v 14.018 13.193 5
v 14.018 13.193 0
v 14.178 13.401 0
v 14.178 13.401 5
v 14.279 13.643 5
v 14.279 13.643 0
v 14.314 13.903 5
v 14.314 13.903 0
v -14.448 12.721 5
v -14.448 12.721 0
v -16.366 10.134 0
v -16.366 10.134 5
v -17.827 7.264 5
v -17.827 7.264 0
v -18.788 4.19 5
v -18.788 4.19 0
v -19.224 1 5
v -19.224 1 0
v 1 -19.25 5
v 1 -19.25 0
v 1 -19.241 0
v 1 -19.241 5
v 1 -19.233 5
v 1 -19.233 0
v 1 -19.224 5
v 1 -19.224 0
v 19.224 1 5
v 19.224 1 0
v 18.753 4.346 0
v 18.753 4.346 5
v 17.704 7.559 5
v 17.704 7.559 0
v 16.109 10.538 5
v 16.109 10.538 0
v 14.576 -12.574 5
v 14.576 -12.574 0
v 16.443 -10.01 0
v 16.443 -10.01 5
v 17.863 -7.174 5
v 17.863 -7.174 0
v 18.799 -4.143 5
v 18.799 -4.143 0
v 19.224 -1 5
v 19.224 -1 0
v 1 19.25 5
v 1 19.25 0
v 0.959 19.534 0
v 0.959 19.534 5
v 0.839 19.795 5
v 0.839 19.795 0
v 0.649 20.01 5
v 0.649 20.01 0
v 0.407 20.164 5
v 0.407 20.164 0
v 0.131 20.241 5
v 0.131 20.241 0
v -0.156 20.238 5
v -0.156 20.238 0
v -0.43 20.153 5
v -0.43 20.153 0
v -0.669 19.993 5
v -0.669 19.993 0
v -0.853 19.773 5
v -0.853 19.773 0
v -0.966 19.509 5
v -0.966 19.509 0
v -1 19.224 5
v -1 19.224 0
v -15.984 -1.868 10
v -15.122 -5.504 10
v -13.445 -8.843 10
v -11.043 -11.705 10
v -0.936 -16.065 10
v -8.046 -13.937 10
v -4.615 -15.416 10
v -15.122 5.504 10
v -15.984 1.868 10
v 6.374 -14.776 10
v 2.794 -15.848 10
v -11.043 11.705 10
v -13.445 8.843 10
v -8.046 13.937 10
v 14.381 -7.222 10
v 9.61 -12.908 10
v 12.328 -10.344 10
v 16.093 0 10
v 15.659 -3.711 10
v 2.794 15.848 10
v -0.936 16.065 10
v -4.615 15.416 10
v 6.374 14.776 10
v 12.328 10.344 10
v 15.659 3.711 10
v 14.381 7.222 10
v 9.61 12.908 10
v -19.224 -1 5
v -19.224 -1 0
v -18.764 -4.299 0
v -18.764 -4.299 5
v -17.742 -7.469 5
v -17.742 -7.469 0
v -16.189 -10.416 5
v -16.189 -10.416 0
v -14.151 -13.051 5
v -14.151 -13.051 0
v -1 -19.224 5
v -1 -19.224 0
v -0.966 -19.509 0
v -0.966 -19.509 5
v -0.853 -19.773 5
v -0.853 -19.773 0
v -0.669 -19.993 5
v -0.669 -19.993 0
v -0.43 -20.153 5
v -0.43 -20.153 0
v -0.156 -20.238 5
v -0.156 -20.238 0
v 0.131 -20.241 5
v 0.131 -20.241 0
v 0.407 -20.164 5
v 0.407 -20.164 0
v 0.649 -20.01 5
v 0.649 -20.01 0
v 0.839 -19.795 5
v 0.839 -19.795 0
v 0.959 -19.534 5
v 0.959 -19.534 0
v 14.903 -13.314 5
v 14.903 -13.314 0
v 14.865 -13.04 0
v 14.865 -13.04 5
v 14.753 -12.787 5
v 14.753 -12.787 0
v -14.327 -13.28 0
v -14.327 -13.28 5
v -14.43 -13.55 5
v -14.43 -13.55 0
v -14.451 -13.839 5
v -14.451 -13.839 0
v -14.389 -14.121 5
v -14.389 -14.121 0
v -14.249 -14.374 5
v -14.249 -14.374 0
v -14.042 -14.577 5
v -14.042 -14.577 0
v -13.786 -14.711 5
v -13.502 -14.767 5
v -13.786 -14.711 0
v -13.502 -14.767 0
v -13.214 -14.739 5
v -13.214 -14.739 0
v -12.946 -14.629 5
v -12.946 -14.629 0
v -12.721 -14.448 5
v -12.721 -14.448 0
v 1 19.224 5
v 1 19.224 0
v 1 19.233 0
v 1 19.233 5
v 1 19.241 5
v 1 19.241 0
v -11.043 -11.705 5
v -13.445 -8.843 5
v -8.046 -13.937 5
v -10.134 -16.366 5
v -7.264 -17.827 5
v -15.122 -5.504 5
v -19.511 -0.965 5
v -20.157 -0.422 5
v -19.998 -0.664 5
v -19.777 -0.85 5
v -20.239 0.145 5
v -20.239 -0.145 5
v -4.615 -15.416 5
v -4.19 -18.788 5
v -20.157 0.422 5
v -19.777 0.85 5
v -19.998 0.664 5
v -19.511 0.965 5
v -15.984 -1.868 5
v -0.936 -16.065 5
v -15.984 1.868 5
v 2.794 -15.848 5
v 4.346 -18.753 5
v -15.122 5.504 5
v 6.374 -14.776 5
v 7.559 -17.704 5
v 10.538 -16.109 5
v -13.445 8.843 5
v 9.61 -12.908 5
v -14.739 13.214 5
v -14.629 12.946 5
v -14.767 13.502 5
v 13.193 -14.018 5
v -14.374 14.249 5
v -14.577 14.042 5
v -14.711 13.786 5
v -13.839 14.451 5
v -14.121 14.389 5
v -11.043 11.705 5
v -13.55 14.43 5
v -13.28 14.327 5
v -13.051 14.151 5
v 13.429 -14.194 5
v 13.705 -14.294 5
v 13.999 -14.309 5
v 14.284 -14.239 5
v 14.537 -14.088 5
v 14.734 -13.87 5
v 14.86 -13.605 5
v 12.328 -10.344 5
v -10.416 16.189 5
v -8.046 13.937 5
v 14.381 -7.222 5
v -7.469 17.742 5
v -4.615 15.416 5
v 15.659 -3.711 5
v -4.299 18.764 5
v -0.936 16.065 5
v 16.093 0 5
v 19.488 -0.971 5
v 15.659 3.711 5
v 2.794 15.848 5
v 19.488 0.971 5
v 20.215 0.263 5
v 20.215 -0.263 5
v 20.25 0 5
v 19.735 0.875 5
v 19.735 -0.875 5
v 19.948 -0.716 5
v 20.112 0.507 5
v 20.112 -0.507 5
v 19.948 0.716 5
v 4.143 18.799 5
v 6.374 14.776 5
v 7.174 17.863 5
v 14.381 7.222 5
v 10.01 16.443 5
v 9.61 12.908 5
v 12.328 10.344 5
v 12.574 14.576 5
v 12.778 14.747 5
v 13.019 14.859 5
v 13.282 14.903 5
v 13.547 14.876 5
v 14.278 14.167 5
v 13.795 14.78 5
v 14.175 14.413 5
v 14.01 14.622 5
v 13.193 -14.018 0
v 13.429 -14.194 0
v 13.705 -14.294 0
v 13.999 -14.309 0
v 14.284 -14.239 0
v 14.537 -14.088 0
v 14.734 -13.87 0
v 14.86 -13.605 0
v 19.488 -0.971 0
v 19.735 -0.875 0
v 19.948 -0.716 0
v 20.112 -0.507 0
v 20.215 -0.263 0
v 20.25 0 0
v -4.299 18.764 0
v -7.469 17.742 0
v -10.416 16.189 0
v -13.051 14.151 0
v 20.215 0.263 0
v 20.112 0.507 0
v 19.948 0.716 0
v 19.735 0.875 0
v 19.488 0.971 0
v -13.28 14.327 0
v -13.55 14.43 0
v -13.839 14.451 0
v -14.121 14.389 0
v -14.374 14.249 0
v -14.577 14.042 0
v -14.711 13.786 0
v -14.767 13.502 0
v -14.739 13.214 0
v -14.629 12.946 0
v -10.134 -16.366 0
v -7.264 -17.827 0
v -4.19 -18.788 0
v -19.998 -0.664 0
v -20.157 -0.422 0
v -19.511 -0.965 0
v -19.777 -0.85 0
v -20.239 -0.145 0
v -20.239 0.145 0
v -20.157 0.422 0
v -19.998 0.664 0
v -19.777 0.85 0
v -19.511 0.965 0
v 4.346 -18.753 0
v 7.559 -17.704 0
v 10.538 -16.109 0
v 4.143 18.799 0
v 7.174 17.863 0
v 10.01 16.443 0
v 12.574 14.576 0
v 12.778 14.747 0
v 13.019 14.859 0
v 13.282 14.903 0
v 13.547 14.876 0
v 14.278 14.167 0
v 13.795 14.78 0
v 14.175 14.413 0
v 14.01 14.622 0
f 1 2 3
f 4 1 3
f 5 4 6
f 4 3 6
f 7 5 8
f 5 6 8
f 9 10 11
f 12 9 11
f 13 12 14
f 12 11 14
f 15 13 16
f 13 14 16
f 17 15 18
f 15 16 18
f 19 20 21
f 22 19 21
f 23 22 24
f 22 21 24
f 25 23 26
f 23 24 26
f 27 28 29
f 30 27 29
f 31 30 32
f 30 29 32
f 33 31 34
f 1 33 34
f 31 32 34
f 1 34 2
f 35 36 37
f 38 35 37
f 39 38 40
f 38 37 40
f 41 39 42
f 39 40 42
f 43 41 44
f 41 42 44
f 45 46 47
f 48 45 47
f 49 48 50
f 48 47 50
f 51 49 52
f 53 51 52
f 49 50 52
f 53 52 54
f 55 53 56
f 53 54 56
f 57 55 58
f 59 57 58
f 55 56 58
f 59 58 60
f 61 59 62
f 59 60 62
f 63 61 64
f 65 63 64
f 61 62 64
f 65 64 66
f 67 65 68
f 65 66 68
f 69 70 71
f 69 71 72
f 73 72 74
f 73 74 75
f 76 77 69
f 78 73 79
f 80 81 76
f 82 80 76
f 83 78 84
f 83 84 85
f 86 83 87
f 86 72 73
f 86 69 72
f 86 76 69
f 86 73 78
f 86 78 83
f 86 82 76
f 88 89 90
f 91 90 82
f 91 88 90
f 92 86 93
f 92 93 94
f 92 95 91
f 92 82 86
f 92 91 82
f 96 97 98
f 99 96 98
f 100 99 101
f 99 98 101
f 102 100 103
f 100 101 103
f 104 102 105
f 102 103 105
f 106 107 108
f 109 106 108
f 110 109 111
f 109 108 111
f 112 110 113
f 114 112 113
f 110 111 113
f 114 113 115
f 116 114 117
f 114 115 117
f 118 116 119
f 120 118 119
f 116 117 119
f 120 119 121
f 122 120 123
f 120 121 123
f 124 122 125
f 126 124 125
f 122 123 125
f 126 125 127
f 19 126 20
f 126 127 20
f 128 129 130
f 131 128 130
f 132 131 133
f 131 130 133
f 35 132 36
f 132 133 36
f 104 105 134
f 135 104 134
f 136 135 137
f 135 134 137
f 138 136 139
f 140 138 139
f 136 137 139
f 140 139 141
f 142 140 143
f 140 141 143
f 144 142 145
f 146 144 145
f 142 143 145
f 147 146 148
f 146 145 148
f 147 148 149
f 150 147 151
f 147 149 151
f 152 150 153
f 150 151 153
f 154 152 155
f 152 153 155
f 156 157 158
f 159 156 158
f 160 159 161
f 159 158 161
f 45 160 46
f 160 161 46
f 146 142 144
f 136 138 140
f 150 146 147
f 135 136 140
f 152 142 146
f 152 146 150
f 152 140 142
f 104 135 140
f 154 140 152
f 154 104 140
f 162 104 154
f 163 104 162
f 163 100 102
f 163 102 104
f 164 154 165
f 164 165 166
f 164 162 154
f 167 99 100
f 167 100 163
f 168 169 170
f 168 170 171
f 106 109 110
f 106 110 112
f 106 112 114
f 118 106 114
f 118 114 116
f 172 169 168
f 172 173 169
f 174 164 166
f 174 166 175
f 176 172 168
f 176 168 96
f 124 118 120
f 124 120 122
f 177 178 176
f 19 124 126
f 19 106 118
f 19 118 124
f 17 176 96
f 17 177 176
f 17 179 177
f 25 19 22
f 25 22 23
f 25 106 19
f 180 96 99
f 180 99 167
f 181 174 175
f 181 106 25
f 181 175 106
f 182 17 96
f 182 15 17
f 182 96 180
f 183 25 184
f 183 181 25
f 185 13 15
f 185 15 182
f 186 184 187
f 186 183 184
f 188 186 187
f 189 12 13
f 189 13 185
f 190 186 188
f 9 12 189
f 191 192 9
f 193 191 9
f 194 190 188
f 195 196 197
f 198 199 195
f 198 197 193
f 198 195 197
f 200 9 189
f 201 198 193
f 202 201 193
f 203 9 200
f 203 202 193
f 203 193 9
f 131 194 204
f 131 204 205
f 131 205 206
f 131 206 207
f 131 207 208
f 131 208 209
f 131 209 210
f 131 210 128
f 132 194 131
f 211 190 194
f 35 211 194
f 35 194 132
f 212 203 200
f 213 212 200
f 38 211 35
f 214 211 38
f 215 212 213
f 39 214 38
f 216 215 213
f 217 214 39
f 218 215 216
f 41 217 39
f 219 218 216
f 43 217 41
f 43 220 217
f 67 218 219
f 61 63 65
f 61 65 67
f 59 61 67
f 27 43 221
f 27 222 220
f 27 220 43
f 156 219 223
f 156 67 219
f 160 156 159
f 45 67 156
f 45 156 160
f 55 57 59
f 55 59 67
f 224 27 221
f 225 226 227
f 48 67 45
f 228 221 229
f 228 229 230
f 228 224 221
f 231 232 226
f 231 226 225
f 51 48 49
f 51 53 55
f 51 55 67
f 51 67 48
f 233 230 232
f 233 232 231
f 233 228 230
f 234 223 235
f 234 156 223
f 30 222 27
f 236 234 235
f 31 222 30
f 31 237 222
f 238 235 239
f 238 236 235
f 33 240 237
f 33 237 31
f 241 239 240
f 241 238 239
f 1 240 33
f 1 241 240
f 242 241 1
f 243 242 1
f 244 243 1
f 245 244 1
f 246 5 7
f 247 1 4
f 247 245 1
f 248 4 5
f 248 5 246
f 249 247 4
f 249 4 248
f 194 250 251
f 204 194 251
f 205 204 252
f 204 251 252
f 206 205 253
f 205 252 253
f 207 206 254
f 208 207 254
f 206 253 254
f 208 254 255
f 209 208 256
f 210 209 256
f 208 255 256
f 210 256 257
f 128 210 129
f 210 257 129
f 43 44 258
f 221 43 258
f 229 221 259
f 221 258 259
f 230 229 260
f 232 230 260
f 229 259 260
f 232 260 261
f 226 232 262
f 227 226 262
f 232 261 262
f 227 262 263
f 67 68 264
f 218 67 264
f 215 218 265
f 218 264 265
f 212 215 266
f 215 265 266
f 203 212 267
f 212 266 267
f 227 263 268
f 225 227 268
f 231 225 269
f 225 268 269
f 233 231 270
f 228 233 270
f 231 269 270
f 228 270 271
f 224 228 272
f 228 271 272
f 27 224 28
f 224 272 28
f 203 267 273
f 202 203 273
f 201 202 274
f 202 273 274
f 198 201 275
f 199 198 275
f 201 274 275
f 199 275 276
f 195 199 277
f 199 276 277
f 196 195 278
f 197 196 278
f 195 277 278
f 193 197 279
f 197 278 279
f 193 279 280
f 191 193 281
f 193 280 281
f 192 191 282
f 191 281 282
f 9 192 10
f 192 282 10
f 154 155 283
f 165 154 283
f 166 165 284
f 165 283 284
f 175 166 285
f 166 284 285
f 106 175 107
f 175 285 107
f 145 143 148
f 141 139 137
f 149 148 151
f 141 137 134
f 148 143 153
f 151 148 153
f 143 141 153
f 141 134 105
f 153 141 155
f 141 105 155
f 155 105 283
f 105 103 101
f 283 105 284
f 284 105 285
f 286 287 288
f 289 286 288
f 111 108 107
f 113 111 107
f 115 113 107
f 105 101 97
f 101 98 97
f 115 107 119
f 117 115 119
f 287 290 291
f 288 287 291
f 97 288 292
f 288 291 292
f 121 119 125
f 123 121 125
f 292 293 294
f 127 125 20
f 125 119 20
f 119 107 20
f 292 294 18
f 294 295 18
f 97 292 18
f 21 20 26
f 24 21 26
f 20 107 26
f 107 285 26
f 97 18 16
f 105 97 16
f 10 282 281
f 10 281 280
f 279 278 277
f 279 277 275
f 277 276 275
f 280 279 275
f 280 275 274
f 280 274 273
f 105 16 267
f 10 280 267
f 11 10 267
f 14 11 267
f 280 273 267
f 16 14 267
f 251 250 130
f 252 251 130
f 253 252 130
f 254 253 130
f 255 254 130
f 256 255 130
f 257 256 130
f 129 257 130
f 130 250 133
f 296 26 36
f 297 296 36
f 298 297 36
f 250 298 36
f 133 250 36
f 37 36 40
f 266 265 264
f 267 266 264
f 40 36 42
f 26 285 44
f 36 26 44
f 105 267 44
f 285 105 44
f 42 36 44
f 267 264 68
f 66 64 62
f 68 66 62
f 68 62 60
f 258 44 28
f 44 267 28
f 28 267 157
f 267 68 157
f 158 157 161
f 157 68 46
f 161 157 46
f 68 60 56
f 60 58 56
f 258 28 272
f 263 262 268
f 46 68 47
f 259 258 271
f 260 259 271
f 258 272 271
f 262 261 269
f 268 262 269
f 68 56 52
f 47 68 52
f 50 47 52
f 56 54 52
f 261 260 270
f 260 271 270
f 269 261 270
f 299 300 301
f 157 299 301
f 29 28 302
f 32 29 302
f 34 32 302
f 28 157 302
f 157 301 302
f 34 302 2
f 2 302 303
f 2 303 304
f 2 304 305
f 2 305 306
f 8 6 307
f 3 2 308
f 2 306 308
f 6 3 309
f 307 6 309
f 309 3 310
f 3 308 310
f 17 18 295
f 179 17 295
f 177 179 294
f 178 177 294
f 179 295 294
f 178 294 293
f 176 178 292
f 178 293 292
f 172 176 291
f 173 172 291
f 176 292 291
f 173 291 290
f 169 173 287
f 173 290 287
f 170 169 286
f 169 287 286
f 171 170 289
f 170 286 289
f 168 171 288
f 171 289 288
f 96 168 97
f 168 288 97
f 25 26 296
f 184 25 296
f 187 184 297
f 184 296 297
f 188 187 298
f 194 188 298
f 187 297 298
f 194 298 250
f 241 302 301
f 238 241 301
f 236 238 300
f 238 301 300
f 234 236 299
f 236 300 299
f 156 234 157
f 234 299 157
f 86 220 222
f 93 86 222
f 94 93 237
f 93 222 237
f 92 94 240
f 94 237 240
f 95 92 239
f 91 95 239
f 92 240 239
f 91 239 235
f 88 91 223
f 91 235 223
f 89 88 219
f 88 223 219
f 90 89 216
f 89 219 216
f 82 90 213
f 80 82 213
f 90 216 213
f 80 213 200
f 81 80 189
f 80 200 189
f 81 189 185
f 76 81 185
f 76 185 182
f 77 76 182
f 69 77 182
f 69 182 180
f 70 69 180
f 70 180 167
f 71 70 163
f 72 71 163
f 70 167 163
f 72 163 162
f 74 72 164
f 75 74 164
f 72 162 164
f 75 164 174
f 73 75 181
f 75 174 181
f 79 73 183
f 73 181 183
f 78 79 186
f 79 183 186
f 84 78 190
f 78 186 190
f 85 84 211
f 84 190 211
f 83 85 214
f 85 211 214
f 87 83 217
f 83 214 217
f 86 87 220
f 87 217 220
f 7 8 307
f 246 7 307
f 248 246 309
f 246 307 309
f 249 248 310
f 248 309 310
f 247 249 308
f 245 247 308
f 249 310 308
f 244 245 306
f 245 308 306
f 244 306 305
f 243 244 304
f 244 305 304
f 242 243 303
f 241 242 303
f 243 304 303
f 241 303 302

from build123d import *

# Parameters (mm, degrees)
F1_DEPTH = 5
F2_R     = 16.0925
F3_DEPTH = 5


with BuildPart() as f1:
    # F0 (on Top) → F1 (new body)
    with BuildSketch(Plane.XY):
        with BuildLine():
            ThreePointArc((19.224025974, -0.9996626181), (19.2435053979, -0.5), (19.25, 0))
            ThreePointArc((19.25, 0), (19.2435053979, 0.5), (19.224025974, 0.9996626181))
            ThreePointArc((19.224025974, 0.9996626181), (18.25, 0), (19.224025974, -0.9996626181))
        make_face()
        with BuildLine():
            ThreePointArc((19.224025974, 0.9996626181), (19.2435053979, 0.5), (19.25, 0))
            ThreePointArc((19.25, 0), (19.2435053979, -0.5), (19.224025974, -0.9996626181))
            ThreePointArc((19.224025974, -0.9996626181), (19.9478631578, -0.716231117), (20.25, 0))
            ThreePointArc((20.25, 0), (19.9478631578, 0.716231117), (19.224025974, 0.9996626181))
        make_face()
        with BuildLine():
            ThreePointArc((19.224025974, -0.9996626181), (18.25, 0), (19.224025974, 0.9996626181))
            ThreePointArc((19.224025974, 0.9996626181), (17.7038739711, 7.558792656), (14.0179049045, 13.1932119702))
            ThreePointArc((14.0179049045, 13.1932119702), (12.6222310158, 13.1811146792), (12.5738865363, 14.5760034774))
            ThreePointArc((12.5738865363, 14.5760034774), (7.1736557935, 17.8634028829), (0.9996626181, 19.224025974))
            ThreePointArc((0.9996626181, 19.224025974), (0, 18.25), (-0.9996626181, 19.224025974))
            ThreePointArc((-0.9996626181, 19.224025974), (-7.4690346519, 17.7419283442), (-13.0505499689, 14.1508178388))
            ThreePointArc((-13.0505499689, 14.1508178388), (-12.8411799857, 13.8300006906), (-12.7678002695, 13.4540022202))
            ThreePointArc((-12.7678002695, 13.4540022202), (-13.3678605948, 12.5374607554), (-14.4478967828, 12.7208796298))
            ThreePointArc((-14.4478967828, 12.7208796298), (-17.8268428947, 7.2640327922), (-19.224025974, 0.9996626181))
            ThreePointArc((-19.224025974, 0.9996626181), (-18.533768883, 0.6978631578), (-18.25, 0))
            ThreePointArc((-18.25, 0), (-18.533768883, -0.6978631578), (-19.224025974, -0.9996626181))
            ThreePointArc((-19.224025974, -0.9996626181), (-17.7419283442, -7.4690346519), (-14.1508178388, -13.0505499689))
            ThreePointArc((-14.1508178388, -13.0505499689), (-13.0646538021, -12.8467097151), (-12.4540022202, -13.7678002695))
            ThreePointArc((-12.4540022202, -13.7678002695), (-12.5231094792, -14.1330928984), (-12.7208796298, -14.4478967828))
            ThreePointArc((-12.7208796298, -14.4478967828), (-7.2640327922, -17.8268428947), (-0.9996626181, -19.224025974))
            ThreePointArc((-0.9996626181, -19.224025974), (0, -18.25), (0.9996626181, -19.224025974))
            ThreePointArc((0.9996626181, -19.224025974), (7.558792656, -17.7038739711), (13.1932119702, -14.0179049045))
            ThreePointArc((13.1932119702, -14.0179049045), (13.1811146792, -12.6222310158), (14.5760034774, -12.5738865363))
            ThreePointArc((14.5760034774, -12.5738865363), (17.8634028829, -7.1736557935), (19.224025974, -0.9996626181))
        make_face()
        with BuildLine():
            ThreePointArc((12.5738865363, 14.5760034774), (12.6222310158, 13.1811146792), (14.0179049045, 13.1932119702))
            ThreePointArc((14.0179049045, 13.1932119702), (13.3138601125, 13.9033675383), (12.5738865363, 14.5760034774))
        make_face()
        with BuildLine():
            ThreePointArc((12.5738865363, 14.5760034774), (13.3138601125, 13.9033675383), (14.0179049045, 13.1932119702))
            ThreePointArc((14.0179049045, 13.1932119702), (14.2369107048, 13.5186889659), (14.3138601125, 13.9033675383))
            ThreePointArc((14.3138601125, 13.9033675383), (13.6744335612, 14.8360983612), (12.5738865363, 14.5760034774))
        make_face()
        with BuildLine():
            ThreePointArc((14.9033675383, -13.3138601125), (14.8178717589, -12.9092837533), (14.5760034774, -12.5738865363))
            ThreePointArc((14.5760034774, -12.5738865363), (13.9033675383, -13.3138601125), (13.1932119702, -14.0179049045))
            ThreePointArc((13.1932119702, -14.0179049045), (14.2840540444, -14.2385642728), (14.9033675383, -13.3138601125))
        make_face()
        with BuildLine():
            ThreePointArc((13.1932119702, -14.0179049045), (13.9033675383, -13.3138601125), (14.5760034774, -12.5738865363))
            ThreePointArc((14.5760034774, -12.5738865363), (13.1811146792, -12.6222310158), (13.1932119702, -14.0179049045))
        make_face()
        with BuildLine():
            ThreePointArc((-0.9996626181, 19.224025974), (0, 18.25), (0.9996626181, 19.224025974))
            ThreePointArc((0.9996626181, 19.224025974), (0, 19.25), (-0.9996626181, 19.224025974))
        make_face()
        with BuildLine():
            ThreePointArc((-0.9996626181, 19.224025974), (0, 19.25), (0.9996626181, 19.224025974))
            ThreePointArc((0.9996626181, 19.224025974), (0.999915651, 19.2370118915), (1, 19.25))
            ThreePointArc((1, 19.25), (-0.0129881085, 20.249915651), (-0.9996626181, 19.224025974))
        make_face()
        with BuildLine():
            ThreePointArc((1, -19.25), (0.999915651, -19.2370118915), (0.9996626181, -19.224025974))
            ThreePointArc((0.9996626181, -19.224025974), (0, -19.25), (-0.9996626181, -19.224025974))
            ThreePointArc((-0.9996626181, -19.224025974), (-0.0129881085, -20.249915651), (1, -19.25))
        make_face()
        with BuildLine():
            ThreePointArc((-0.9996626181, -19.224025974), (0, -19.25), (0.9996626181, -19.224025974))
            ThreePointArc((0.9996626181, -19.224025974), (0, -18.25), (-0.9996626181, -19.224025974))
        make_face()
        with BuildLine():
            ThreePointArc((-12.7678002695, 13.4540022202), (-12.8411799857, 13.8300006906), (-13.0505499689, 14.1508178388))
            ThreePointArc((-13.0505499689, 14.1508178388), (-13.7678002695, 13.4540022202), (-14.4478967828, 12.7208796298))
            ThreePointArc((-14.4478967828, 12.7208796298), (-13.3678605948, 12.5374607554), (-12.7678002695, 13.4540022202))
        make_face()
        with BuildLine():
            ThreePointArc((-14.4478967828, 12.7208796298), (-13.7678002695, 13.4540022202), (-13.0505499689, 14.1508178388))
            ThreePointArc((-13.0505499689, 14.1508178388), (-14.4830106731, 14.1529114264), (-14.4478967828, 12.7208796298))
        make_face()
        with BuildLine():
            ThreePointArc((-14.1508178388, -13.0505499689), (-14.1529114264, -14.4830106731), (-12.7208796298, -14.4478967828))
            ThreePointArc((-12.7208796298, -14.4478967828), (-13.4540022202, -13.7678002695), (-14.1508178388, -13.0505499689))
        make_face()
        with BuildLine():
            ThreePointArc((-14.1508178388, -13.0505499689), (-13.4540022202, -13.7678002695), (-12.7208796298, -14.4478967828))
            ThreePointArc((-12.7208796298, -14.4478967828), (-12.5231094792, -14.1330928984), (-12.4540022202, -13.7678002695))
            ThreePointArc((-12.4540022202, -13.7678002695), (-13.0646538021, -12.8467097151), (-14.1508178388, -13.0505499689))
        make_face()
        with BuildLine():
            ThreePointArc((-18.25, 0), (-18.533768883, 0.6978631578), (-19.224025974, 0.9996626181))
            ThreePointArc((-19.224025974, 0.9996626181), (-19.25, 0), (-19.224025974, -0.9996626181))
            ThreePointArc((-19.224025974, -0.9996626181), (-18.533768883, -0.6978631578), (-18.25, 0))
        make_face()
        with BuildLine():
            ThreePointArc((-19.224025974, -0.9996626181), (-19.25, 0), (-19.224025974, 0.9996626181))
            ThreePointArc((-19.224025974, 0.9996626181), (-20.25, 0), (-19.224025974, -0.9996626181))
        make_face()
    extrude(amount=F1_DEPTH)

    # F2 (on face) → F3 (join)
    with BuildSketch(Plane.XY.offset(5)):
        Circle(F2_R)
    extrude(amount=F3_DEPTH)


solid = f1.part
